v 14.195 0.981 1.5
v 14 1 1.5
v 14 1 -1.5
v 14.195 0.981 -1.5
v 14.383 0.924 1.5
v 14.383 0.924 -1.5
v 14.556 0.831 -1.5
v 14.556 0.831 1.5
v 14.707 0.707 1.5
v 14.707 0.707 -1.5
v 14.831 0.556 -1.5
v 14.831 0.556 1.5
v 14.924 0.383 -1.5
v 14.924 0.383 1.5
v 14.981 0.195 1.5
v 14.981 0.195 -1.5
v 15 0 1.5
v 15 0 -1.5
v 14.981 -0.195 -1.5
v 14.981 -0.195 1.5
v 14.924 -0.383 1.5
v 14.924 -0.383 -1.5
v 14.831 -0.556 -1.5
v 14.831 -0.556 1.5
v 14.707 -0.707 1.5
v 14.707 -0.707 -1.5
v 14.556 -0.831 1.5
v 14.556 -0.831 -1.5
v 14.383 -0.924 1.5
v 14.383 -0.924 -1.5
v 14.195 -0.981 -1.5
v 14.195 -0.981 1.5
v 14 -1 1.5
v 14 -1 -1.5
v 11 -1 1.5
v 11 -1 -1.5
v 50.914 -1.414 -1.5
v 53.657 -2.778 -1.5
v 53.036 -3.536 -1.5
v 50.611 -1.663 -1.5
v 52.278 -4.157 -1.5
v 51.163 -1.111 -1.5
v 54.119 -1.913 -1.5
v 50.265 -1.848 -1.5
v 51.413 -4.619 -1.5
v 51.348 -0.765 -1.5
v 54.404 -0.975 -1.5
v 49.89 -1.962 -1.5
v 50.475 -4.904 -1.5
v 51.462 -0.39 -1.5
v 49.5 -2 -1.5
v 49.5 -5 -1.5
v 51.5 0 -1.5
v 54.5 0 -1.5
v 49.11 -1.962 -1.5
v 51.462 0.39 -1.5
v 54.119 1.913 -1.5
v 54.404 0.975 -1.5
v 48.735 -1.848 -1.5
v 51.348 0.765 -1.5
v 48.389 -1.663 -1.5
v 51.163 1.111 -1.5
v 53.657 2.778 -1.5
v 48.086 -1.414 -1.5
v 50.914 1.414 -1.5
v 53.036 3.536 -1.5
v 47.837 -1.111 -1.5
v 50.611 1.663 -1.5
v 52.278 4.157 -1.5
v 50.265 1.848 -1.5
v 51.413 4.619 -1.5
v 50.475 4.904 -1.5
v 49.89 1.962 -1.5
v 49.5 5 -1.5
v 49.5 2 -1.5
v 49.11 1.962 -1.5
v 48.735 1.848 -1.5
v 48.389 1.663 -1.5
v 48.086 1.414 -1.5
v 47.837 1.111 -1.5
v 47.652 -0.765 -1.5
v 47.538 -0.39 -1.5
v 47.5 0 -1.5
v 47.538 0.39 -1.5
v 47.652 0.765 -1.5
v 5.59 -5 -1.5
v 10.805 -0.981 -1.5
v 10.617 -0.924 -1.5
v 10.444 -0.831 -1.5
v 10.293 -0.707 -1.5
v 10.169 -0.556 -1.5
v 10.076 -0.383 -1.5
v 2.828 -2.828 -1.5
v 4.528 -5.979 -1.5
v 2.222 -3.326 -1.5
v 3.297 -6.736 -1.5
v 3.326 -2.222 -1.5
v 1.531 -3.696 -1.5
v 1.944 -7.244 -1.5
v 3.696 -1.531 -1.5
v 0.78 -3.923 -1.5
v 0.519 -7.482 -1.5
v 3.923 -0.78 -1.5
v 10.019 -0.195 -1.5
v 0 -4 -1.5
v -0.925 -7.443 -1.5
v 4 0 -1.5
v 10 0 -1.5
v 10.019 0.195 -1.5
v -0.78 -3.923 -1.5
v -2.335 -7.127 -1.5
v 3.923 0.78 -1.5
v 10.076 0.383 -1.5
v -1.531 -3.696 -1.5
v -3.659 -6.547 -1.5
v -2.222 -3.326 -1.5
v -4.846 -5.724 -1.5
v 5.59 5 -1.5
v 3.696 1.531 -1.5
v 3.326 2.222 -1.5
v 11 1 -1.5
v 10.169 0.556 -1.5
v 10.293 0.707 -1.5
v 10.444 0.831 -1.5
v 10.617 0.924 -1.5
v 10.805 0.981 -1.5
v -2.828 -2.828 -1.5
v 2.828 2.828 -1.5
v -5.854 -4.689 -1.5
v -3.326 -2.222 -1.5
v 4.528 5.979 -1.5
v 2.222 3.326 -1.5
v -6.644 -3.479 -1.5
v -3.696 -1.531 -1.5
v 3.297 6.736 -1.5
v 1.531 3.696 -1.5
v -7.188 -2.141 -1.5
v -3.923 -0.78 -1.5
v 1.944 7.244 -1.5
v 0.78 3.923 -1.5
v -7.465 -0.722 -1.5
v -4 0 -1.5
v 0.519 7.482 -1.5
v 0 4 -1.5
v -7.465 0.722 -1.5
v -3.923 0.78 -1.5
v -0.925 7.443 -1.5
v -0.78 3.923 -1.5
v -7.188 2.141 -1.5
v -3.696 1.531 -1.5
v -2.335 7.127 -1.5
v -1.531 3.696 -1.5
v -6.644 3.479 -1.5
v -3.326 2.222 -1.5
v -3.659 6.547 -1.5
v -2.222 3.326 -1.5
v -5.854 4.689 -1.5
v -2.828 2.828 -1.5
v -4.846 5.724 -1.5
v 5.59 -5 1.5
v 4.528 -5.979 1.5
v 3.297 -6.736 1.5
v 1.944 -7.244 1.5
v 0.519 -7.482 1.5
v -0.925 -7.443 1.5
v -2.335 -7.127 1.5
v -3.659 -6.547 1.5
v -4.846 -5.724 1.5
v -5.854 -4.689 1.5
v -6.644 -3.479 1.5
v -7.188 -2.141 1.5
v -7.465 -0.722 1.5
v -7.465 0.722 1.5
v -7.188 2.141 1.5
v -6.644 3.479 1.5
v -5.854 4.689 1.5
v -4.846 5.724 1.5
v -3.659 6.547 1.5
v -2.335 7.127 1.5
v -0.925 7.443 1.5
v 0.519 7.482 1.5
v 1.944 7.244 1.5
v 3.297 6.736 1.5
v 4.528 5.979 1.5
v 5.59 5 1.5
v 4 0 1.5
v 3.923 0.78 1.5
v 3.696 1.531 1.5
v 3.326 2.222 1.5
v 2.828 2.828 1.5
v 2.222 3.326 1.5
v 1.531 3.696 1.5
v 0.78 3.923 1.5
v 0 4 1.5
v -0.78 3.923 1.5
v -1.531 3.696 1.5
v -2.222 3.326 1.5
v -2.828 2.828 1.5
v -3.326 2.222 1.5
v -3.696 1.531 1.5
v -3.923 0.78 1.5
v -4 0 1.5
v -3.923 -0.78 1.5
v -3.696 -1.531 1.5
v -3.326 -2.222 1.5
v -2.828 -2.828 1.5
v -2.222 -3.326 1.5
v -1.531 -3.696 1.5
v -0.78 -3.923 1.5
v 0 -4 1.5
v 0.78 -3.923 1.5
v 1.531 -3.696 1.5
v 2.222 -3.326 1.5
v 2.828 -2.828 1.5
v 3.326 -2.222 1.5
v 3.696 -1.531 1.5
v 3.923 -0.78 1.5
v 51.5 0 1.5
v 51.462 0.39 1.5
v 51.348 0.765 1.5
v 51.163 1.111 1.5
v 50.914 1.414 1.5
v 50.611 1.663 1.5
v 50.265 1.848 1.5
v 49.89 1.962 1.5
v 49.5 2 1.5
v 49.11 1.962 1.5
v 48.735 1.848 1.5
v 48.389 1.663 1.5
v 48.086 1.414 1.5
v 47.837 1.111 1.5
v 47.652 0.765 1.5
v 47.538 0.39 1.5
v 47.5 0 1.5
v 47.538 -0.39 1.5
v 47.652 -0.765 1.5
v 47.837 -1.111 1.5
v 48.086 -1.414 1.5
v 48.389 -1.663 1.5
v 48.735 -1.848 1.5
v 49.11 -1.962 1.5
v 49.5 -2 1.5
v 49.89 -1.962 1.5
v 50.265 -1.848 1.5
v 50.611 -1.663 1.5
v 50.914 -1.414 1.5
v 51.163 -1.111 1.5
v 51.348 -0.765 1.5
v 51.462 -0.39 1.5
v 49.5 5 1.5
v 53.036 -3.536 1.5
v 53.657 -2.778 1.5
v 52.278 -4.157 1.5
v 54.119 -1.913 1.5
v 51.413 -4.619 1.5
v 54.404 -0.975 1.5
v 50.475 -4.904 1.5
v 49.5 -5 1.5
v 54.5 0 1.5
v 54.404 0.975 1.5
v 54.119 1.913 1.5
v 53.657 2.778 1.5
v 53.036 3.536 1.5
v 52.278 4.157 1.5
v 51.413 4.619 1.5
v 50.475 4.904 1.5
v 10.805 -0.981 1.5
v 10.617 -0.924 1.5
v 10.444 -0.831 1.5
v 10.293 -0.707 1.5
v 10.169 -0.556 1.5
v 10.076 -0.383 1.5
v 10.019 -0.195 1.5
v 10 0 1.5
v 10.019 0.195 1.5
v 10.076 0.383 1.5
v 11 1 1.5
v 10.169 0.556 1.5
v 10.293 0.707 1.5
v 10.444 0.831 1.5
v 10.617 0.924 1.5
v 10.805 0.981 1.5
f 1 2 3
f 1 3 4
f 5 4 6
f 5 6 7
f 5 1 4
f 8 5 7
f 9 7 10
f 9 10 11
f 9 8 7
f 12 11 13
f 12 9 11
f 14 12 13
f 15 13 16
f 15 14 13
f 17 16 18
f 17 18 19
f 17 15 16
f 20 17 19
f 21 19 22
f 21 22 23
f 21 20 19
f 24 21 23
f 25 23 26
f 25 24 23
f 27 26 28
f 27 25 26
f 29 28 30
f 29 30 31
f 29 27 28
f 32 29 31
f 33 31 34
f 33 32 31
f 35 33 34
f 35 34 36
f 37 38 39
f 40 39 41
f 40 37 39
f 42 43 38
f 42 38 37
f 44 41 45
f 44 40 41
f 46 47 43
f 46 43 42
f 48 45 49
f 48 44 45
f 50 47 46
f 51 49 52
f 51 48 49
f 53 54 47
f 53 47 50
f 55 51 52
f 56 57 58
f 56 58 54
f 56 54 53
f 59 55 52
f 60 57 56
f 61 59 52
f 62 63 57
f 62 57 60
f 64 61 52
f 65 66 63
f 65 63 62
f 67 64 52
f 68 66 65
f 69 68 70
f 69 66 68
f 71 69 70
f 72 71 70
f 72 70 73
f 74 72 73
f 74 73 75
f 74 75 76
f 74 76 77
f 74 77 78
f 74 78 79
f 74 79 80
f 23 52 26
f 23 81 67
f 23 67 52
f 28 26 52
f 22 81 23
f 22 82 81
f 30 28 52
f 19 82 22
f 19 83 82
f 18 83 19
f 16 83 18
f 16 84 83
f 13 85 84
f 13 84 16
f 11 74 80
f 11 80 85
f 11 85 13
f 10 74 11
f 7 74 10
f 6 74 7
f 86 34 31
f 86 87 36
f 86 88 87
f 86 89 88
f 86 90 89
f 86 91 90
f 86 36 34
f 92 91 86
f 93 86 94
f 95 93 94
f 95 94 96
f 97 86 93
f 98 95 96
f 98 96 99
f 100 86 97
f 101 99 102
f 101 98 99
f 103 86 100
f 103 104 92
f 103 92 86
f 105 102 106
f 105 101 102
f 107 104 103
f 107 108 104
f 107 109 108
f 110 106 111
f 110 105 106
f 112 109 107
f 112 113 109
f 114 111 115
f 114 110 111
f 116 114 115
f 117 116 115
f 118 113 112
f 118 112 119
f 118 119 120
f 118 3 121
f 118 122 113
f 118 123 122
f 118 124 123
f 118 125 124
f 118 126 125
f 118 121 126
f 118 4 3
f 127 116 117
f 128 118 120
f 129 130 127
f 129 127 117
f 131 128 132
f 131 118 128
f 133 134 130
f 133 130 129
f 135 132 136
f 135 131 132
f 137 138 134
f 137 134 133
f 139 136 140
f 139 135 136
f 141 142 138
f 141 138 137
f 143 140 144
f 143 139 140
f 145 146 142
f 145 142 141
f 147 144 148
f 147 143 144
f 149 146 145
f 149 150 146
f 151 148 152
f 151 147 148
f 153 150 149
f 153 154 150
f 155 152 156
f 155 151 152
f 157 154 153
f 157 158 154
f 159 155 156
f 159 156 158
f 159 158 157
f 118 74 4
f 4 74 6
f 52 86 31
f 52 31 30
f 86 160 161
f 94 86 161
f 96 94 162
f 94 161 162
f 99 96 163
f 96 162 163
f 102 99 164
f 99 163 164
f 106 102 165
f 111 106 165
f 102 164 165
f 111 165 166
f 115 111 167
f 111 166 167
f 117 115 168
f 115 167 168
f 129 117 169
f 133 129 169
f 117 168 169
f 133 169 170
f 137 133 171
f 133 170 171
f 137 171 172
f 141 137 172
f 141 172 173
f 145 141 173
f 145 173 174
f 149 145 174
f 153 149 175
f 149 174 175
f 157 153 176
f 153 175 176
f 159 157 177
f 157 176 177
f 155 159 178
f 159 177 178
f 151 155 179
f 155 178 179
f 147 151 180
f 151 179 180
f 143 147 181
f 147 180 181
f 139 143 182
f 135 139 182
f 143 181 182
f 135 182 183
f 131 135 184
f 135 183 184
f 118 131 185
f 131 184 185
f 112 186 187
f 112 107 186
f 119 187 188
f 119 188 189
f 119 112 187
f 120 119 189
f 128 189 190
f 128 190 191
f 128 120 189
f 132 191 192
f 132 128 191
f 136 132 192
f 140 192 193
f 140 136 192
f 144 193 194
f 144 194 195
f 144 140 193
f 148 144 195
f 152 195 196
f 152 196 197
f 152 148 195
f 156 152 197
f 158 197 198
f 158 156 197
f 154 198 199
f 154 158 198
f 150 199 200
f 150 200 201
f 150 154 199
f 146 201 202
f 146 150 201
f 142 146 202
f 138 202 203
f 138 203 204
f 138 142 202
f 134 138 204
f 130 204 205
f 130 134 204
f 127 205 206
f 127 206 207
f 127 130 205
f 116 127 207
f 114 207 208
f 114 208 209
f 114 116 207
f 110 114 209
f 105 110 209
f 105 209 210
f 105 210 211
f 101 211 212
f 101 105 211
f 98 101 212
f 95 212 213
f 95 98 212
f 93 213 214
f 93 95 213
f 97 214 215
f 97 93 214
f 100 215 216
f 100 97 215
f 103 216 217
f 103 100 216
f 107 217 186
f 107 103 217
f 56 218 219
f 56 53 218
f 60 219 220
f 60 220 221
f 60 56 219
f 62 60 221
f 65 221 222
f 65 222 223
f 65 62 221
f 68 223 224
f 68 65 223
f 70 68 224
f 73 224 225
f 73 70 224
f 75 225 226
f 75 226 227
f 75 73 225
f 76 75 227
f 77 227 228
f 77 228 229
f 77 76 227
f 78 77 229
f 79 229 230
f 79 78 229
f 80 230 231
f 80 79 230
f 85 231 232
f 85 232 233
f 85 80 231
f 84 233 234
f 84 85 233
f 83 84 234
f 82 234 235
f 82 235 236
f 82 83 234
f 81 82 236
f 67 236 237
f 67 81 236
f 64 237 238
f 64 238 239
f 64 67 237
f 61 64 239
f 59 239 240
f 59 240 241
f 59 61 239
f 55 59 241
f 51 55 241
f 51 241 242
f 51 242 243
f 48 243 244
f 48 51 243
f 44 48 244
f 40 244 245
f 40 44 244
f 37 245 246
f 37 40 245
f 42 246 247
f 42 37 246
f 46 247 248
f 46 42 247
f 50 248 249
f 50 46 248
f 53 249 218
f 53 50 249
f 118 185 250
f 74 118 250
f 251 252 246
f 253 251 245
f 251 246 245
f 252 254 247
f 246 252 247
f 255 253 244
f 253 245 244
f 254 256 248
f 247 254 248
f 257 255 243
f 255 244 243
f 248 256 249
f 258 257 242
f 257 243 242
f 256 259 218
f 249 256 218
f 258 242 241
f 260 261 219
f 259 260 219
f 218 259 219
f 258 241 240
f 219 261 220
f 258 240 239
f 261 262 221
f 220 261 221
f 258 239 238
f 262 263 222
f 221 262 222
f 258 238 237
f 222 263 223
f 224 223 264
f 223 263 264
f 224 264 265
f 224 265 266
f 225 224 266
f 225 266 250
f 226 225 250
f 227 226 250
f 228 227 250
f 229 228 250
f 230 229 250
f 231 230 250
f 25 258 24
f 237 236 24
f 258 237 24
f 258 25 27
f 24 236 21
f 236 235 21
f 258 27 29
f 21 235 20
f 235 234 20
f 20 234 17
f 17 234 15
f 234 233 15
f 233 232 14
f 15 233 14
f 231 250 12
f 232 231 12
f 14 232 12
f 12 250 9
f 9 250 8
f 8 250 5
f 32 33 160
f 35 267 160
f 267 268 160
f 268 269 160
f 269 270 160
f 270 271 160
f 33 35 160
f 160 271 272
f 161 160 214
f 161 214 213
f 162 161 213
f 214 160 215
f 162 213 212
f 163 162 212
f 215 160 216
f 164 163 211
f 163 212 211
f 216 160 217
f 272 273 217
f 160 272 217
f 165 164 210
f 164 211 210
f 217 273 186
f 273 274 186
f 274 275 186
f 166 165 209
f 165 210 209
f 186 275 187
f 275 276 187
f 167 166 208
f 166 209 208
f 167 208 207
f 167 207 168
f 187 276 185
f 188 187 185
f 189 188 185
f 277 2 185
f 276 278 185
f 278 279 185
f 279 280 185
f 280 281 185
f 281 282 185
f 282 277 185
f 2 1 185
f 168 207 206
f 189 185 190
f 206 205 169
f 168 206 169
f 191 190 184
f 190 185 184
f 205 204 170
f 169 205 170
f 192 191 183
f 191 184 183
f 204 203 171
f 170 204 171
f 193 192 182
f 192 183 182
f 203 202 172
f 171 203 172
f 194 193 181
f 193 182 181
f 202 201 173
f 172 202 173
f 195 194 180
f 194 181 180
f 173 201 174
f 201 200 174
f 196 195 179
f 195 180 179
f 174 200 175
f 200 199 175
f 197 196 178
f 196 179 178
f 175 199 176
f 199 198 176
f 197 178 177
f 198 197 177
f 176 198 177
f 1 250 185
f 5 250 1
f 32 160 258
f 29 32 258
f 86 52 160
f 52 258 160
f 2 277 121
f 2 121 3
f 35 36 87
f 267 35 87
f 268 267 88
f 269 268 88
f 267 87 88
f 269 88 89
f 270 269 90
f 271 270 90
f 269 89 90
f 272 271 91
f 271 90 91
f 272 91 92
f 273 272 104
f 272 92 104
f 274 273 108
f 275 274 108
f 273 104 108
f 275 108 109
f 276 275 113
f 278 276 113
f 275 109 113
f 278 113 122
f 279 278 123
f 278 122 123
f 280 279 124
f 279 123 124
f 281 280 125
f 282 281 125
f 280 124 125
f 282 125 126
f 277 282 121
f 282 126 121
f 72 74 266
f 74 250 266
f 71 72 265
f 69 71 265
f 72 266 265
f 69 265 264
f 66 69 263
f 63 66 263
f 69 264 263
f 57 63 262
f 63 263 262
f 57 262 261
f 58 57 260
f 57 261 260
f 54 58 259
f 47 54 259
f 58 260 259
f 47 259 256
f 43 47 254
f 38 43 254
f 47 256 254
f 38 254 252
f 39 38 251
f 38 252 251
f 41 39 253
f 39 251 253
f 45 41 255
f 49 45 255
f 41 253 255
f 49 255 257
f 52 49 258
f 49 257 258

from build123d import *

# Parameters (mm, degrees)
SKETCH_1_R      = 4
SKETCH_1_R_2    = 2
EXTRUDE_1_DEPTH = 1.5


with BuildPart() as part:
    # 草图1 → 凸台-拉伸1 (new, symmetric)
    with BuildSketch(Plane.XY):
        with BuildLine():
            Line((5.590169944, 5), (49.5, 5))
            ThreePointArc((49.5, 5), (54.5, 0), (49.5, -5))
            Line((49.5, -5), (5.590169944, -5))
            ThreePointArc((5.590169944, -5), (-7.5, 0), (5.590169944, 5))
        make_face()
        Circle(SKETCH_1_R, mode=Mode.SUBTRACT)
        with Locations((49.5, 0)):
            Circle(SKETCH_1_R_2, mode=Mode.SUBTRACT)
        with BuildLine():
            Line((11, 1), (14, 1))
            ThreePointArc((14, 1), (15, 0), (14, -1))
            Line((14, -1), (11, -1))
            ThreePointArc((11, -1), (10, 0), (11, 1))
        make_face(mode=Mode.SUBTRACT)
    extrude(amount=EXTRUDE_1_DEPTH, both=True)


solid = part.part
